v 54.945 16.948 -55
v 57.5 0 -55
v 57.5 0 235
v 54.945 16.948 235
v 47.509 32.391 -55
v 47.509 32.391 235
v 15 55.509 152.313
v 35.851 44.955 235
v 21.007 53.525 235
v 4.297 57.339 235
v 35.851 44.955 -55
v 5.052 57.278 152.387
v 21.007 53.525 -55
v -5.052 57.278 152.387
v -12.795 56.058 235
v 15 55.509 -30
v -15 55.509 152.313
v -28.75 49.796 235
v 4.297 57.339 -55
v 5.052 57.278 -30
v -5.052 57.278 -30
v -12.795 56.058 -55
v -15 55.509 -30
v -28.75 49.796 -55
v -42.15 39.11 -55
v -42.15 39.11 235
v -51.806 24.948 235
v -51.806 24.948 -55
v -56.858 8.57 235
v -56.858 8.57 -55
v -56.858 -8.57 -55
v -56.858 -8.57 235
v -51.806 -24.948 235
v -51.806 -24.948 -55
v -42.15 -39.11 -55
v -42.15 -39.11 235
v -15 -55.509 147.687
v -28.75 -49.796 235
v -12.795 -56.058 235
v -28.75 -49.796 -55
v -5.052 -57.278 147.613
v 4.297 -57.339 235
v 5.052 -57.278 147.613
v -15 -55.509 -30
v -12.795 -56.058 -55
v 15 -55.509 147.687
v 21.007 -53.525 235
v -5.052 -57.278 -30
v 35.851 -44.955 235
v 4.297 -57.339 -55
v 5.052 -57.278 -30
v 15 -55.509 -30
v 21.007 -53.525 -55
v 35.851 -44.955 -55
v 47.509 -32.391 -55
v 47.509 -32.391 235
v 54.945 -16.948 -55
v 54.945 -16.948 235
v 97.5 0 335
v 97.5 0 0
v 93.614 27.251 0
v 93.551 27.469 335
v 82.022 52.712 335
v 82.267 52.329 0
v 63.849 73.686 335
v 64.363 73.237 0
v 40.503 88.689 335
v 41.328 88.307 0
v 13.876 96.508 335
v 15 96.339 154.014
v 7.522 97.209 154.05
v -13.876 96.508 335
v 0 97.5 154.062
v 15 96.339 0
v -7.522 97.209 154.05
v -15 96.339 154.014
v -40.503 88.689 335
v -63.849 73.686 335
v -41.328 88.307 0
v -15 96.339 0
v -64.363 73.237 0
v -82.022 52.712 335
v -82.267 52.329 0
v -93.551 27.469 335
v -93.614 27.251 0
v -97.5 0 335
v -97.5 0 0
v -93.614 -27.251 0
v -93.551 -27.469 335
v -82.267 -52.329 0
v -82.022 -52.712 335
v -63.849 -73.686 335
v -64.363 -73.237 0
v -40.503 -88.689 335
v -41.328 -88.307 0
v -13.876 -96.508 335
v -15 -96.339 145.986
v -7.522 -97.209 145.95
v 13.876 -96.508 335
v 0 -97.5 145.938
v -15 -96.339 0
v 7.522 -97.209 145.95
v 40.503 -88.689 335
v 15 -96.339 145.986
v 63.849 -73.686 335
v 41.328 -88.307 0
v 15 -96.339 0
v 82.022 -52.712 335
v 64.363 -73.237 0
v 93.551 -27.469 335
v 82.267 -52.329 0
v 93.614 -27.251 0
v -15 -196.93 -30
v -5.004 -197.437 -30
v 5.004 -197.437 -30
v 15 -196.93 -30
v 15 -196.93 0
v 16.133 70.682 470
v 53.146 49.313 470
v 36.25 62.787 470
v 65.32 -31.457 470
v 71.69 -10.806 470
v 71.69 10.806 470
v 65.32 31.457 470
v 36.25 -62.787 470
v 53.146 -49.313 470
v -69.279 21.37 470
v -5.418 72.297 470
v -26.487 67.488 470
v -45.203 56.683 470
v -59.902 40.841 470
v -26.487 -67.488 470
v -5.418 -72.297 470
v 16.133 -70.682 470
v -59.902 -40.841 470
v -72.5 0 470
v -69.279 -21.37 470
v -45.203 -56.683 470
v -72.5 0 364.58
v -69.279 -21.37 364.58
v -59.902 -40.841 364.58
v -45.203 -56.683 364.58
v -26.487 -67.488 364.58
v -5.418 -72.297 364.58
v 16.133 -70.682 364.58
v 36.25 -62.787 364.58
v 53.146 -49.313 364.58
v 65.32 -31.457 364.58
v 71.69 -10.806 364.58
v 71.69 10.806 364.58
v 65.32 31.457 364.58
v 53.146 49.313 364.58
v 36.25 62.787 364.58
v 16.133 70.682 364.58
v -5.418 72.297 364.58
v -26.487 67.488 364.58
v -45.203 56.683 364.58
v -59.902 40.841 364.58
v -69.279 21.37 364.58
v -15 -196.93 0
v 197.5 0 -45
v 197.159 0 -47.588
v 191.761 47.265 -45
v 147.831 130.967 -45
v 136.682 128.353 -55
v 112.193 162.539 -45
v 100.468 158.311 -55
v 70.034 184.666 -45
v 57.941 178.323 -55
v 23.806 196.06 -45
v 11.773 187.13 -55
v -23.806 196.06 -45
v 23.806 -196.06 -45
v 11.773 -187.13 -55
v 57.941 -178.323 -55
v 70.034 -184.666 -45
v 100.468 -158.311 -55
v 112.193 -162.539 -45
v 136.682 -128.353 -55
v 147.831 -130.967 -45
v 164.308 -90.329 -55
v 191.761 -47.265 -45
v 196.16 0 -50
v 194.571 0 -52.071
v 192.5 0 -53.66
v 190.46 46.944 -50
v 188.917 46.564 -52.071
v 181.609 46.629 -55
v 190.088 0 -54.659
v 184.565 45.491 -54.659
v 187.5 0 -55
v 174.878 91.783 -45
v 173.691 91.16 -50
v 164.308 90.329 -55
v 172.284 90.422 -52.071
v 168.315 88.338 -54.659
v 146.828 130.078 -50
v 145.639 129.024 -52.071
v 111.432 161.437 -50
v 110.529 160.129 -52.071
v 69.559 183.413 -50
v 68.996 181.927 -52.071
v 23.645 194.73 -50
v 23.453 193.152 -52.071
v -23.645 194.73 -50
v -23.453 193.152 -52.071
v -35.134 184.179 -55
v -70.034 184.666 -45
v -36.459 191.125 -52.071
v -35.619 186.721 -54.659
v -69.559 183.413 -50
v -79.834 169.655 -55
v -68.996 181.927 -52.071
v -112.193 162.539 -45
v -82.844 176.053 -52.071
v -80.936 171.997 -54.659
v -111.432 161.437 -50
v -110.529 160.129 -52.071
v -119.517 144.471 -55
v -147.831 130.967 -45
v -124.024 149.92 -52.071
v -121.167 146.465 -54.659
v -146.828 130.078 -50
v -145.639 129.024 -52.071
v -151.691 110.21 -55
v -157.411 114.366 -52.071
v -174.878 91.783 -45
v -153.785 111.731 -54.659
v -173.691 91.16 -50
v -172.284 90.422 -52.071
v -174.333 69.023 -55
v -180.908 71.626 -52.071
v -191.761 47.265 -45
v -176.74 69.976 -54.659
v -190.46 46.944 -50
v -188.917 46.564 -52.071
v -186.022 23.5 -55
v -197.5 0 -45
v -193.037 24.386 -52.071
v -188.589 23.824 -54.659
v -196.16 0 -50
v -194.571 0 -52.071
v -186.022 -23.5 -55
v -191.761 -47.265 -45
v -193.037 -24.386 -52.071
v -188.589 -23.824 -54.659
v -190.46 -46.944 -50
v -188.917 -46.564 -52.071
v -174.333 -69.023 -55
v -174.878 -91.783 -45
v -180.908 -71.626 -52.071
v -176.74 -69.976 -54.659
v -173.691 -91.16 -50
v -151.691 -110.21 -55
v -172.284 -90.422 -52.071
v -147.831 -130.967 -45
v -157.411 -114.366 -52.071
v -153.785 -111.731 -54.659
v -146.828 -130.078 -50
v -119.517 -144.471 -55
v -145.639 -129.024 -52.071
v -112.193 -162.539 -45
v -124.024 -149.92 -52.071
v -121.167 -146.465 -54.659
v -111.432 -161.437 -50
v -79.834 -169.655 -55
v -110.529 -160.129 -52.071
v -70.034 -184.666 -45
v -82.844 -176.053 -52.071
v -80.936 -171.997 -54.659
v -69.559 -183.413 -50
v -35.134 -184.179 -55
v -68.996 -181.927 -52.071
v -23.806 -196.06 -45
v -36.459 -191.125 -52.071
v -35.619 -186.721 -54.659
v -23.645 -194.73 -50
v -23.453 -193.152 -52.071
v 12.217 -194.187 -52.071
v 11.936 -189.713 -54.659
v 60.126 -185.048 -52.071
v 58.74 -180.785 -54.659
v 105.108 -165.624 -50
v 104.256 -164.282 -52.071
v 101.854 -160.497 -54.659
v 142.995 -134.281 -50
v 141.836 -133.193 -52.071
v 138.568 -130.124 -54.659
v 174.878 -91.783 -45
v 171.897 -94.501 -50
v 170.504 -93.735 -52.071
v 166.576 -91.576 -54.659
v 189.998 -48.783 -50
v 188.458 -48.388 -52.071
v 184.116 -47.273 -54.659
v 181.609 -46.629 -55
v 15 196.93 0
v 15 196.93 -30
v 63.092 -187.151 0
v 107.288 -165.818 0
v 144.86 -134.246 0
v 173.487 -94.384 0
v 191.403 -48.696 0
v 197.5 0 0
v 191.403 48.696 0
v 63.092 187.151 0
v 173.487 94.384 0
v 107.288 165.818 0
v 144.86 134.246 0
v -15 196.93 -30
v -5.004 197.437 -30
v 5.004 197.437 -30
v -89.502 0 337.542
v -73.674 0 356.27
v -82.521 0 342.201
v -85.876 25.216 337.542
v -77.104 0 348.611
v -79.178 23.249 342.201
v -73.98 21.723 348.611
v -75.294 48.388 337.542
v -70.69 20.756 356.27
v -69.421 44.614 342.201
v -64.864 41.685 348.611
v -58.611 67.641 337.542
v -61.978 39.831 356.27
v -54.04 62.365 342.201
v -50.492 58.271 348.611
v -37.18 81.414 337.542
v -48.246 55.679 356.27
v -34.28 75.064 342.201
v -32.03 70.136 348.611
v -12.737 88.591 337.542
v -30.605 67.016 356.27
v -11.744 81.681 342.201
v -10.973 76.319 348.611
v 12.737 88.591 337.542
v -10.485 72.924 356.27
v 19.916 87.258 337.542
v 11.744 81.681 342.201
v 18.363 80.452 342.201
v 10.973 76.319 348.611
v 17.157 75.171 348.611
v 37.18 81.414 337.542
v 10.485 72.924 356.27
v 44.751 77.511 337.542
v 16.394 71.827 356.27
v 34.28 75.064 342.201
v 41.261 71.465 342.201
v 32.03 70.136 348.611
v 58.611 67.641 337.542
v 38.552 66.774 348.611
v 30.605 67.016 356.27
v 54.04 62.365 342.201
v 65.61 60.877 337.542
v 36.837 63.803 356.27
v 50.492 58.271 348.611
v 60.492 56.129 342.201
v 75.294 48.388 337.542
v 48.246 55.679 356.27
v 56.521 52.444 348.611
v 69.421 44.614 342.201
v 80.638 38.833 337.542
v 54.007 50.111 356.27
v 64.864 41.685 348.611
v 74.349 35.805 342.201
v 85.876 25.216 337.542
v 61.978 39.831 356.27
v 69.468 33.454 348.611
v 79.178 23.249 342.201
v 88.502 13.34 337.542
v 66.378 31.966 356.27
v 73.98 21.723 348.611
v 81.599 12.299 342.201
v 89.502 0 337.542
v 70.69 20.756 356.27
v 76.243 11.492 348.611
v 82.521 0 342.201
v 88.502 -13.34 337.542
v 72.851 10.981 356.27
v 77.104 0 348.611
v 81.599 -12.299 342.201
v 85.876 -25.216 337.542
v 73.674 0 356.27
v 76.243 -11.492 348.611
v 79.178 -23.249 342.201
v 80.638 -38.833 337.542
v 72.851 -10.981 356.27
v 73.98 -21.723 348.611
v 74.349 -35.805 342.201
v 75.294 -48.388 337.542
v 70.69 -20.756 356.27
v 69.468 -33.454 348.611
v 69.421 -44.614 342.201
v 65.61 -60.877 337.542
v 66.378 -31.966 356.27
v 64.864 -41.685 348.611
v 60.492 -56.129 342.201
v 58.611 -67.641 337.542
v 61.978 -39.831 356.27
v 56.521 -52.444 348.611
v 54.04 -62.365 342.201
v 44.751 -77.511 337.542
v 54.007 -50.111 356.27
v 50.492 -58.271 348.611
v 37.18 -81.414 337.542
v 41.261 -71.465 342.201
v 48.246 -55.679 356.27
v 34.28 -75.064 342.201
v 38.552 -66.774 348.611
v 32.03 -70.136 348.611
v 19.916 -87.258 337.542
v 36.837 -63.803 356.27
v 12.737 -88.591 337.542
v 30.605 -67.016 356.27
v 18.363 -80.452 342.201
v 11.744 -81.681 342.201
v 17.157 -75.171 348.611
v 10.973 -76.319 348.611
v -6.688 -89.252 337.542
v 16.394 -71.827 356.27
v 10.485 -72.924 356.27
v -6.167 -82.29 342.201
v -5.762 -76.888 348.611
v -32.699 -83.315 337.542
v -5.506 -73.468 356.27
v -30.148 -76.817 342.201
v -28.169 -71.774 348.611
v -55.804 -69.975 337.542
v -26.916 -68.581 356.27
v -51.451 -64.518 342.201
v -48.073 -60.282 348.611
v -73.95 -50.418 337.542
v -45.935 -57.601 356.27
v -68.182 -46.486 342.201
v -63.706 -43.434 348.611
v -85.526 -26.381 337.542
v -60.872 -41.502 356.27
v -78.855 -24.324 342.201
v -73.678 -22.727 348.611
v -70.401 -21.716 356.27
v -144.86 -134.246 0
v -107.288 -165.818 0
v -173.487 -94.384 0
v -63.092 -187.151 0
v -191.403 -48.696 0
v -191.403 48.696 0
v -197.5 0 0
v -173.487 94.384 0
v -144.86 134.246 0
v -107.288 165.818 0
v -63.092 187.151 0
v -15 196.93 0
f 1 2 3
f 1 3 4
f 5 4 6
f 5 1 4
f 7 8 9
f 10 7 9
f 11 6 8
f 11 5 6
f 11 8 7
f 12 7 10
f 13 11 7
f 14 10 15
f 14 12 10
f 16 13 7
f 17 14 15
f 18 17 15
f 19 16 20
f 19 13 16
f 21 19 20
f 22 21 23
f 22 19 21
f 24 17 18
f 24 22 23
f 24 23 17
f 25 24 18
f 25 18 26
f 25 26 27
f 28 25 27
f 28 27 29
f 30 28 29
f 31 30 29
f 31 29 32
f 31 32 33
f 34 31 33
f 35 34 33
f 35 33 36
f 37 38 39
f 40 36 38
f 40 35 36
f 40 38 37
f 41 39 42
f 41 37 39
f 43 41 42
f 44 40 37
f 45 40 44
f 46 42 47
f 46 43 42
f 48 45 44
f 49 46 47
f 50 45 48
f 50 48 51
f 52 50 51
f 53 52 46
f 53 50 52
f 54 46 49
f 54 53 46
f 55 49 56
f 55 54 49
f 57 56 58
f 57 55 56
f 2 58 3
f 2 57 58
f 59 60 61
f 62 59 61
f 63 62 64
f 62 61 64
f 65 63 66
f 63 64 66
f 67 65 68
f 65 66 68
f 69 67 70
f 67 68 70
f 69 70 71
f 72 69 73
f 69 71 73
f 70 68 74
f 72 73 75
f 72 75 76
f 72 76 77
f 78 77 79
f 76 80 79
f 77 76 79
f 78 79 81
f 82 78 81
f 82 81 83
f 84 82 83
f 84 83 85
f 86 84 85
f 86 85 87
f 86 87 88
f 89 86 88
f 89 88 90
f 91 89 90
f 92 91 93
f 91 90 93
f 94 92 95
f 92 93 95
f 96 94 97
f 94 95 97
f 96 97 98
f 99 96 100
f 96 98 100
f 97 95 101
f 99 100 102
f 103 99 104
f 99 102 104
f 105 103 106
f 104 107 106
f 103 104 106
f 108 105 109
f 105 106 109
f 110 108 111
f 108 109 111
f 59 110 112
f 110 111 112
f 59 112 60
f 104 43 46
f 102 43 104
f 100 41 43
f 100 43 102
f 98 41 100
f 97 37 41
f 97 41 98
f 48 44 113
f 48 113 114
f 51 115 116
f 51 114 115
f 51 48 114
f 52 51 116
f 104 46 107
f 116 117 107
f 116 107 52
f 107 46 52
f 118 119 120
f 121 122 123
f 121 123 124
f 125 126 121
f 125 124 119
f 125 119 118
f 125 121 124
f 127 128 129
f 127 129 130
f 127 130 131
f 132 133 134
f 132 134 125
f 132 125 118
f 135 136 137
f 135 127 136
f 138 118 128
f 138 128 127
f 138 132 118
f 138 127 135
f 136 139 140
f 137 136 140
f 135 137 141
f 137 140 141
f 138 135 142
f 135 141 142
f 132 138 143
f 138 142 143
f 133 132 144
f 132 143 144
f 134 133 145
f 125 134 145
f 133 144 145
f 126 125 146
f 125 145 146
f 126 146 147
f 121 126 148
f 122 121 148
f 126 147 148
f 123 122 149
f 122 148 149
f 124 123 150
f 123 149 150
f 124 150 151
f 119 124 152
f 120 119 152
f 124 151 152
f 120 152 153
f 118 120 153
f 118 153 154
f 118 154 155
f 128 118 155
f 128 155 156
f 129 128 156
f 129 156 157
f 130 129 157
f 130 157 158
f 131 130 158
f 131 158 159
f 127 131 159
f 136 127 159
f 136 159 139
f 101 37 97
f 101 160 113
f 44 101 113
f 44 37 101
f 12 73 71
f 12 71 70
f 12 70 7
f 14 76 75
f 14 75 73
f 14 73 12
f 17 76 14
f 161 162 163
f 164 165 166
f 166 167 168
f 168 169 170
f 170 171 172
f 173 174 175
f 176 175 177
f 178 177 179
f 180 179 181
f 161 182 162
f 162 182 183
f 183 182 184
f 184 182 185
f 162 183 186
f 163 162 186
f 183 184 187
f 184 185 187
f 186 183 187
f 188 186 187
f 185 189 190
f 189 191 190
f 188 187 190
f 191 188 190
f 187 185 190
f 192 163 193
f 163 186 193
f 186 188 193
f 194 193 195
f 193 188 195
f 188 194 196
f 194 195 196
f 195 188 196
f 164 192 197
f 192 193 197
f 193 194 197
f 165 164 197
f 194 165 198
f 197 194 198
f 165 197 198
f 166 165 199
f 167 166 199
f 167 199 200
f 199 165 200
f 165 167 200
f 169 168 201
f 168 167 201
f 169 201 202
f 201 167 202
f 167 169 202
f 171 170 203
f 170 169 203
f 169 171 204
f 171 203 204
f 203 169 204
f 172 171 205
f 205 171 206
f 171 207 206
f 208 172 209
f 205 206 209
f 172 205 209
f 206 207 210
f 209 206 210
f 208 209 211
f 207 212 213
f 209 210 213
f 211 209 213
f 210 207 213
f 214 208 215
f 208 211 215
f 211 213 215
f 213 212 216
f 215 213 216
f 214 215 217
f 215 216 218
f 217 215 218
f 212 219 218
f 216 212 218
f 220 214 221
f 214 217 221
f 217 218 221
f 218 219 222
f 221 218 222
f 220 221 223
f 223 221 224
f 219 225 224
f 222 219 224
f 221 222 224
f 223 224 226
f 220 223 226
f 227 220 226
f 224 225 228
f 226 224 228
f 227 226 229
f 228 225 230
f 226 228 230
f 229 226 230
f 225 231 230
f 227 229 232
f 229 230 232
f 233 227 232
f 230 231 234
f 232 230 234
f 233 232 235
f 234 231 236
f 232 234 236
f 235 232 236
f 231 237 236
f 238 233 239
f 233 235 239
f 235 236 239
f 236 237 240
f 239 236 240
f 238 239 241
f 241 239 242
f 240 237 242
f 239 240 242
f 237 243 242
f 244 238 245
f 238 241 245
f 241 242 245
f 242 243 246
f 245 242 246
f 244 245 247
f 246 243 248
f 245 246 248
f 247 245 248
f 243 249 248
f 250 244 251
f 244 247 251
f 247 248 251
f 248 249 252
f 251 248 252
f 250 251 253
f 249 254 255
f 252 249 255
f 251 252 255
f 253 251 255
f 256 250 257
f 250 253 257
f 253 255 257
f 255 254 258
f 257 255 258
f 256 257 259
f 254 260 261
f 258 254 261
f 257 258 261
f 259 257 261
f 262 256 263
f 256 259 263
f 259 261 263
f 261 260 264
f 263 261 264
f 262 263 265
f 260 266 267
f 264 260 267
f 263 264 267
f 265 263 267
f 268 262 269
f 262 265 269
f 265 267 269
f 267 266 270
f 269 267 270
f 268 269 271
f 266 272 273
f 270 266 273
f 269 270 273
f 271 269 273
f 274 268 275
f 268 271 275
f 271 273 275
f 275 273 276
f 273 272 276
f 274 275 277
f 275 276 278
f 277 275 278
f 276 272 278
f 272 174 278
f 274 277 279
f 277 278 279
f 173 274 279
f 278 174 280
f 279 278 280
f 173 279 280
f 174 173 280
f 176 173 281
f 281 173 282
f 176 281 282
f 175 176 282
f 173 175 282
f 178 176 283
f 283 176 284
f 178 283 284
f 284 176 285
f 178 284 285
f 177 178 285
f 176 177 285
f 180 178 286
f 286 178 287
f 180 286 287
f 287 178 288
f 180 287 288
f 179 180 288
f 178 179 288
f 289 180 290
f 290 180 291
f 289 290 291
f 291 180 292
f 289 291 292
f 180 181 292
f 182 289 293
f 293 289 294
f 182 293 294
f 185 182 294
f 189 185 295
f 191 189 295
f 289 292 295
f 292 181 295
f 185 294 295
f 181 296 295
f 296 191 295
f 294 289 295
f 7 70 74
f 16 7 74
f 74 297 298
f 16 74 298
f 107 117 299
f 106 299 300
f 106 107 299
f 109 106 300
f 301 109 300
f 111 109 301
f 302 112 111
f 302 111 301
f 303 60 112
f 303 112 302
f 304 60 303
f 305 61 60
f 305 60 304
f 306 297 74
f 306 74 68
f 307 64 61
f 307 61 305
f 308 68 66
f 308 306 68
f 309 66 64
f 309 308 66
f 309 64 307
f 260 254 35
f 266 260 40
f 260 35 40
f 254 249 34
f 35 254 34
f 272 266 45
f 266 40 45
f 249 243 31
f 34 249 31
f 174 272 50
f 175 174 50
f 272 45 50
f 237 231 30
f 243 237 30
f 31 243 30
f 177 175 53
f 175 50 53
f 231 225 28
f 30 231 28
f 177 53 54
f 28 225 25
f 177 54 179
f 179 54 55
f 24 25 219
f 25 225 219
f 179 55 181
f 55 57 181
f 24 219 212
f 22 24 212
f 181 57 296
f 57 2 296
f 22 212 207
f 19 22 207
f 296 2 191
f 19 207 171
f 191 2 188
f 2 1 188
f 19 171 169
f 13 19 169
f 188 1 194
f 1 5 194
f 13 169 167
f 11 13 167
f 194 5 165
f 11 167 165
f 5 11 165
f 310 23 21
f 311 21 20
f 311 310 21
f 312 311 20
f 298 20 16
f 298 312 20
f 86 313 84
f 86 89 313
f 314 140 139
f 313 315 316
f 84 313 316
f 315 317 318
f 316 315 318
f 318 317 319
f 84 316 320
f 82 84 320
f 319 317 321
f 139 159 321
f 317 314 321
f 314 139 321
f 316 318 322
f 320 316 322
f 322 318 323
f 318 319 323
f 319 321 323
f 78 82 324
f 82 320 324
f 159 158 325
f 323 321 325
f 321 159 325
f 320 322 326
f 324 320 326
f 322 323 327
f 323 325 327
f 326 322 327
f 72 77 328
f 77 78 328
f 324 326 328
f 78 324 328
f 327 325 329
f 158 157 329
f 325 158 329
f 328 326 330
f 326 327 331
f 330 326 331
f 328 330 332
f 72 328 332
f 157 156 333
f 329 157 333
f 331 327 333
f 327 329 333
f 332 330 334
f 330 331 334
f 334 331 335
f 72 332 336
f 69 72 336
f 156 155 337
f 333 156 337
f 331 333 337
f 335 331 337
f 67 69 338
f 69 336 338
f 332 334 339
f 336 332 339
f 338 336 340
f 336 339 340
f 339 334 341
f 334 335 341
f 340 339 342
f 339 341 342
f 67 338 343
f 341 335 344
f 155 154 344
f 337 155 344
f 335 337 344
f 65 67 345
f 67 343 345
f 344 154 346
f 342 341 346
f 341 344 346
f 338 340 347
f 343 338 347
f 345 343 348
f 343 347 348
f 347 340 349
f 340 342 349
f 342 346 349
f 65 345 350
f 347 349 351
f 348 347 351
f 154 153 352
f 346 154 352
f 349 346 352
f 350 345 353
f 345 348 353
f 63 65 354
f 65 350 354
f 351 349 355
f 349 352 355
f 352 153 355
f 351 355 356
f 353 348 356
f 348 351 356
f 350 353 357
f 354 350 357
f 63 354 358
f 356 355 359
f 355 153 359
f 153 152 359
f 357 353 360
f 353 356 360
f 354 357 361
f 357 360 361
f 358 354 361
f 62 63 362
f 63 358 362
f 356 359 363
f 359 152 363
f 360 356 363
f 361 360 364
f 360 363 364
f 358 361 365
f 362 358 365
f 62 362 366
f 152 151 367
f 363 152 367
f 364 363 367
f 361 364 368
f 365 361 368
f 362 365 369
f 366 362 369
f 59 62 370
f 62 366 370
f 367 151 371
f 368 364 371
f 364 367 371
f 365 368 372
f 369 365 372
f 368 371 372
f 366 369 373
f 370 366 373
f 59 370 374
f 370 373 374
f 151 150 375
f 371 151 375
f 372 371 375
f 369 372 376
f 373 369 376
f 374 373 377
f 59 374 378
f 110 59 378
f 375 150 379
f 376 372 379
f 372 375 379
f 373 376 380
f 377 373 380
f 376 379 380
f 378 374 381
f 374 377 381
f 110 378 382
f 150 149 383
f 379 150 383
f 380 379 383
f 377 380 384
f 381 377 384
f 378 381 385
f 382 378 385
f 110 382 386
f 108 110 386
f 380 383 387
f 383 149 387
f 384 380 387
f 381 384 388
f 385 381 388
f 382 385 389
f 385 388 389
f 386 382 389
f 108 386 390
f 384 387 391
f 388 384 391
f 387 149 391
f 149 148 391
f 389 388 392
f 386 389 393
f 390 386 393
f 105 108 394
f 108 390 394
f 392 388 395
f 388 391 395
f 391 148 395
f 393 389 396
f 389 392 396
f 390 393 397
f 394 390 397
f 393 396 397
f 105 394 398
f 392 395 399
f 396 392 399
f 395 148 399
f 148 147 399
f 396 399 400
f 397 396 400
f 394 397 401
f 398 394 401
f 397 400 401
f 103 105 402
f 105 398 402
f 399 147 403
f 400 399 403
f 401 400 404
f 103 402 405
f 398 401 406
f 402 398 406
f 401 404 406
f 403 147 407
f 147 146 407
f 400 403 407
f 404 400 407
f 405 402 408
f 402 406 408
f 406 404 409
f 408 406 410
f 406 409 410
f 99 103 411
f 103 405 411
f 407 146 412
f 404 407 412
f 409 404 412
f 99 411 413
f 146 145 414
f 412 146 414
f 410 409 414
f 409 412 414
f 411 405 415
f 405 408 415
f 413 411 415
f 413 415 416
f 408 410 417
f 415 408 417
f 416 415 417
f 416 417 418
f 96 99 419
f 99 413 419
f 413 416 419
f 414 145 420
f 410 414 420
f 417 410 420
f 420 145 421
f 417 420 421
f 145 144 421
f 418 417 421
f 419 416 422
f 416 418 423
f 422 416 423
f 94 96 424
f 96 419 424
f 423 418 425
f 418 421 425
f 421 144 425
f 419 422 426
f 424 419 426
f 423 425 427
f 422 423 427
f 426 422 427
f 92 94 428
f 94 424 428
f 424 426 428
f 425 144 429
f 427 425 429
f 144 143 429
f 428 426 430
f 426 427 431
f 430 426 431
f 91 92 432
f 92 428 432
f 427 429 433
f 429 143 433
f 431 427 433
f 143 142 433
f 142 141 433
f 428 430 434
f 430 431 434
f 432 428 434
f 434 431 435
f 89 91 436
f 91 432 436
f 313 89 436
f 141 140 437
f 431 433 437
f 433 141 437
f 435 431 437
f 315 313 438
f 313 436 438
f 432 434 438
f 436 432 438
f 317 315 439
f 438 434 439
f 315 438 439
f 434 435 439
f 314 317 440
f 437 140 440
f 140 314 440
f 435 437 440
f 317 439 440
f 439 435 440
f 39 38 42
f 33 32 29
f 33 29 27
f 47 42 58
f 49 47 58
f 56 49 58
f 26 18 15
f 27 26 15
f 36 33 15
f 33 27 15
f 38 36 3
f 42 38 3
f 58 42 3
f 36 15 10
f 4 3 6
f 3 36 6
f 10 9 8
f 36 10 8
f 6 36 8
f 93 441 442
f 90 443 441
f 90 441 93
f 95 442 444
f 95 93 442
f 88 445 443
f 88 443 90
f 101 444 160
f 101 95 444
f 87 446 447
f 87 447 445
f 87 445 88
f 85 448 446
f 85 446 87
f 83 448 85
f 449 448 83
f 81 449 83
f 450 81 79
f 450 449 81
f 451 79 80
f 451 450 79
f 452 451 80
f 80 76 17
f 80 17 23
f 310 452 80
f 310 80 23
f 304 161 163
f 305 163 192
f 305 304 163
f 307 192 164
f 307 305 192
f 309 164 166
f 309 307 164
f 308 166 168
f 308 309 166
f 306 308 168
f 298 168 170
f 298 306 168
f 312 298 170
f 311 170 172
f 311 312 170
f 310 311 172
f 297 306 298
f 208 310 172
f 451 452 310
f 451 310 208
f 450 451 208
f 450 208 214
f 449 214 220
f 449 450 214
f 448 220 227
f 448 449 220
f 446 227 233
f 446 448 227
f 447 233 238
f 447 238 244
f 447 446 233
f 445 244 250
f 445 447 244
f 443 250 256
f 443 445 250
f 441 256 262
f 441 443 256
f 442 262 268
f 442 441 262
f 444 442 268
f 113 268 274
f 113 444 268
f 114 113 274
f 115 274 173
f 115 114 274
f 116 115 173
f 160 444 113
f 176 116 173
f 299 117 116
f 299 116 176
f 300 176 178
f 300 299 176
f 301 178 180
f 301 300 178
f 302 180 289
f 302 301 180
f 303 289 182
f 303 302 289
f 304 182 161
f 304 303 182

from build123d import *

# Parameters (mm, degrees)
SKETCH1_R               = 197.5
BOSS_EXTRUDE1_DEPTH     = 55
SKETCH2_R               = 97.5
BOSS_EXTRUDE2_DEPTH     = 335
SKETCH3_R               = 72.5
BOSS_EXTRUDE3_DEPTH     = 470
CUT_EXTRUDE1_DEPTH      = 30
CUT_EXTRUDE2_DEPTH      = 15
CUT_EXTRUDE2_DEPTH_BACK = 15
CUT_EXTRUDE3_DEPTH      = 235
CUT_EXTRUDE3_DEPTH_BACK = 285
SKETCH8_R               = 57.5
FILLET1_R               = 30
FILLET2_R               = 10


with BuildPart() as part:
    # Sketch1 → Boss-Extrude1 (new body)
    with BuildSketch(Plane.XY):
        Circle(SKETCH1_R)
    extrude(amount=-BOSS_EXTRUDE1_DEPTH)

    # Sketch2 → Boss-Extrude2 (add)
    with BuildSketch(Plane.XY):
        Circle(SKETCH2_R)
    extrude(amount=BOSS_EXTRUDE2_DEPTH)

    # Sketch3 → Boss-Extrude3 (add)
    with BuildSketch(Plane.XY):
        with Locations(Location((0, 0, 0), (0, 0, 180))):
            Circle(SKETCH3_R)
    extrude(amount=BOSS_EXTRUDE3_DEPTH)

    # Sketch4 → Cut-Extrude1 (cut)
    with BuildSketch(Plane.XY):
        Polygon((0, 197.5), (-15, 197.5), (-15, -197.5), (0, -197.5), (15, -197.5), (15, 197.5), align=None)
    extrude(amount=-CUT_EXTRUDE1_DEPTH, mode=Mode.SUBTRACT)

    # Sketch7 → Cut-Extrude2 (cut, two sides: drawn at the far end of the back side and taken through both)
    with BuildSketch(Plane(origin=(0, 0, 0), x_dir=(0, 0, -1), z_dir=(1, 0, 0)).offset(-CUT_EXTRUDE2_DEPTH_BACK)):
        Polygon((0, 0), (0, 273), (-161.375, 273), (-138.625, -273), (0, -273), align=None)
    extrude(amount=CUT_EXTRUDE2_DEPTH + CUT_EXTRUDE2_DEPTH_BACK, mode=Mode.SUBTRACT)

    # Sketch8 → Cut-Extrude3 (cut, two sides: drawn at the far end of the back side and taken through both)
    with BuildSketch(Plane.XY.offset(-CUT_EXTRUDE3_DEPTH_BACK)):
        Circle(SKETCH8_R)
    extrude(amount=CUT_EXTRUDE3_DEPTH + CUT_EXTRUDE3_DEPTH_BACK, mode=Mode.SUBTRACT)

    # Fillet1
    # the kernel refuses this fillet: 30 mm, written as the material it adds along each edge
    with BuildSketch(Plane(origin=(0, 0, 335), x_dir=(-1, 0, 0), z_dir=(0, -1, 0))) as fillet1_piece_1:
        with BuildLine():
            CenterArc((102.5, -29.580398916), FILLET1_R, 99.594068227, 80.405931773)
            Line((72.5, -29.580398916), (71.9, -29.580398916))
            Line((71.9, -29.580398916), (71.9, 0))
            Line((71.9, 0), (72.5, 0.6))
            ThreePointArc((72.5, 0.6), (85, 0.6), (97.4, 0.591607978))
            Line((97.4, 0.591607978), (97.5, 0))
        make_face()
    revolve(axis=Axis((0, 0, 335), (0, 0, -1)))

    # Fillet2
    fillet2_edges = [part.edges().sort_by_distance(p)[0] for p in [
        (-197.5, 0, -55),
    ]]
    fillet(fillet2_edges, radius=FILLET2_R)


solid = part.part
